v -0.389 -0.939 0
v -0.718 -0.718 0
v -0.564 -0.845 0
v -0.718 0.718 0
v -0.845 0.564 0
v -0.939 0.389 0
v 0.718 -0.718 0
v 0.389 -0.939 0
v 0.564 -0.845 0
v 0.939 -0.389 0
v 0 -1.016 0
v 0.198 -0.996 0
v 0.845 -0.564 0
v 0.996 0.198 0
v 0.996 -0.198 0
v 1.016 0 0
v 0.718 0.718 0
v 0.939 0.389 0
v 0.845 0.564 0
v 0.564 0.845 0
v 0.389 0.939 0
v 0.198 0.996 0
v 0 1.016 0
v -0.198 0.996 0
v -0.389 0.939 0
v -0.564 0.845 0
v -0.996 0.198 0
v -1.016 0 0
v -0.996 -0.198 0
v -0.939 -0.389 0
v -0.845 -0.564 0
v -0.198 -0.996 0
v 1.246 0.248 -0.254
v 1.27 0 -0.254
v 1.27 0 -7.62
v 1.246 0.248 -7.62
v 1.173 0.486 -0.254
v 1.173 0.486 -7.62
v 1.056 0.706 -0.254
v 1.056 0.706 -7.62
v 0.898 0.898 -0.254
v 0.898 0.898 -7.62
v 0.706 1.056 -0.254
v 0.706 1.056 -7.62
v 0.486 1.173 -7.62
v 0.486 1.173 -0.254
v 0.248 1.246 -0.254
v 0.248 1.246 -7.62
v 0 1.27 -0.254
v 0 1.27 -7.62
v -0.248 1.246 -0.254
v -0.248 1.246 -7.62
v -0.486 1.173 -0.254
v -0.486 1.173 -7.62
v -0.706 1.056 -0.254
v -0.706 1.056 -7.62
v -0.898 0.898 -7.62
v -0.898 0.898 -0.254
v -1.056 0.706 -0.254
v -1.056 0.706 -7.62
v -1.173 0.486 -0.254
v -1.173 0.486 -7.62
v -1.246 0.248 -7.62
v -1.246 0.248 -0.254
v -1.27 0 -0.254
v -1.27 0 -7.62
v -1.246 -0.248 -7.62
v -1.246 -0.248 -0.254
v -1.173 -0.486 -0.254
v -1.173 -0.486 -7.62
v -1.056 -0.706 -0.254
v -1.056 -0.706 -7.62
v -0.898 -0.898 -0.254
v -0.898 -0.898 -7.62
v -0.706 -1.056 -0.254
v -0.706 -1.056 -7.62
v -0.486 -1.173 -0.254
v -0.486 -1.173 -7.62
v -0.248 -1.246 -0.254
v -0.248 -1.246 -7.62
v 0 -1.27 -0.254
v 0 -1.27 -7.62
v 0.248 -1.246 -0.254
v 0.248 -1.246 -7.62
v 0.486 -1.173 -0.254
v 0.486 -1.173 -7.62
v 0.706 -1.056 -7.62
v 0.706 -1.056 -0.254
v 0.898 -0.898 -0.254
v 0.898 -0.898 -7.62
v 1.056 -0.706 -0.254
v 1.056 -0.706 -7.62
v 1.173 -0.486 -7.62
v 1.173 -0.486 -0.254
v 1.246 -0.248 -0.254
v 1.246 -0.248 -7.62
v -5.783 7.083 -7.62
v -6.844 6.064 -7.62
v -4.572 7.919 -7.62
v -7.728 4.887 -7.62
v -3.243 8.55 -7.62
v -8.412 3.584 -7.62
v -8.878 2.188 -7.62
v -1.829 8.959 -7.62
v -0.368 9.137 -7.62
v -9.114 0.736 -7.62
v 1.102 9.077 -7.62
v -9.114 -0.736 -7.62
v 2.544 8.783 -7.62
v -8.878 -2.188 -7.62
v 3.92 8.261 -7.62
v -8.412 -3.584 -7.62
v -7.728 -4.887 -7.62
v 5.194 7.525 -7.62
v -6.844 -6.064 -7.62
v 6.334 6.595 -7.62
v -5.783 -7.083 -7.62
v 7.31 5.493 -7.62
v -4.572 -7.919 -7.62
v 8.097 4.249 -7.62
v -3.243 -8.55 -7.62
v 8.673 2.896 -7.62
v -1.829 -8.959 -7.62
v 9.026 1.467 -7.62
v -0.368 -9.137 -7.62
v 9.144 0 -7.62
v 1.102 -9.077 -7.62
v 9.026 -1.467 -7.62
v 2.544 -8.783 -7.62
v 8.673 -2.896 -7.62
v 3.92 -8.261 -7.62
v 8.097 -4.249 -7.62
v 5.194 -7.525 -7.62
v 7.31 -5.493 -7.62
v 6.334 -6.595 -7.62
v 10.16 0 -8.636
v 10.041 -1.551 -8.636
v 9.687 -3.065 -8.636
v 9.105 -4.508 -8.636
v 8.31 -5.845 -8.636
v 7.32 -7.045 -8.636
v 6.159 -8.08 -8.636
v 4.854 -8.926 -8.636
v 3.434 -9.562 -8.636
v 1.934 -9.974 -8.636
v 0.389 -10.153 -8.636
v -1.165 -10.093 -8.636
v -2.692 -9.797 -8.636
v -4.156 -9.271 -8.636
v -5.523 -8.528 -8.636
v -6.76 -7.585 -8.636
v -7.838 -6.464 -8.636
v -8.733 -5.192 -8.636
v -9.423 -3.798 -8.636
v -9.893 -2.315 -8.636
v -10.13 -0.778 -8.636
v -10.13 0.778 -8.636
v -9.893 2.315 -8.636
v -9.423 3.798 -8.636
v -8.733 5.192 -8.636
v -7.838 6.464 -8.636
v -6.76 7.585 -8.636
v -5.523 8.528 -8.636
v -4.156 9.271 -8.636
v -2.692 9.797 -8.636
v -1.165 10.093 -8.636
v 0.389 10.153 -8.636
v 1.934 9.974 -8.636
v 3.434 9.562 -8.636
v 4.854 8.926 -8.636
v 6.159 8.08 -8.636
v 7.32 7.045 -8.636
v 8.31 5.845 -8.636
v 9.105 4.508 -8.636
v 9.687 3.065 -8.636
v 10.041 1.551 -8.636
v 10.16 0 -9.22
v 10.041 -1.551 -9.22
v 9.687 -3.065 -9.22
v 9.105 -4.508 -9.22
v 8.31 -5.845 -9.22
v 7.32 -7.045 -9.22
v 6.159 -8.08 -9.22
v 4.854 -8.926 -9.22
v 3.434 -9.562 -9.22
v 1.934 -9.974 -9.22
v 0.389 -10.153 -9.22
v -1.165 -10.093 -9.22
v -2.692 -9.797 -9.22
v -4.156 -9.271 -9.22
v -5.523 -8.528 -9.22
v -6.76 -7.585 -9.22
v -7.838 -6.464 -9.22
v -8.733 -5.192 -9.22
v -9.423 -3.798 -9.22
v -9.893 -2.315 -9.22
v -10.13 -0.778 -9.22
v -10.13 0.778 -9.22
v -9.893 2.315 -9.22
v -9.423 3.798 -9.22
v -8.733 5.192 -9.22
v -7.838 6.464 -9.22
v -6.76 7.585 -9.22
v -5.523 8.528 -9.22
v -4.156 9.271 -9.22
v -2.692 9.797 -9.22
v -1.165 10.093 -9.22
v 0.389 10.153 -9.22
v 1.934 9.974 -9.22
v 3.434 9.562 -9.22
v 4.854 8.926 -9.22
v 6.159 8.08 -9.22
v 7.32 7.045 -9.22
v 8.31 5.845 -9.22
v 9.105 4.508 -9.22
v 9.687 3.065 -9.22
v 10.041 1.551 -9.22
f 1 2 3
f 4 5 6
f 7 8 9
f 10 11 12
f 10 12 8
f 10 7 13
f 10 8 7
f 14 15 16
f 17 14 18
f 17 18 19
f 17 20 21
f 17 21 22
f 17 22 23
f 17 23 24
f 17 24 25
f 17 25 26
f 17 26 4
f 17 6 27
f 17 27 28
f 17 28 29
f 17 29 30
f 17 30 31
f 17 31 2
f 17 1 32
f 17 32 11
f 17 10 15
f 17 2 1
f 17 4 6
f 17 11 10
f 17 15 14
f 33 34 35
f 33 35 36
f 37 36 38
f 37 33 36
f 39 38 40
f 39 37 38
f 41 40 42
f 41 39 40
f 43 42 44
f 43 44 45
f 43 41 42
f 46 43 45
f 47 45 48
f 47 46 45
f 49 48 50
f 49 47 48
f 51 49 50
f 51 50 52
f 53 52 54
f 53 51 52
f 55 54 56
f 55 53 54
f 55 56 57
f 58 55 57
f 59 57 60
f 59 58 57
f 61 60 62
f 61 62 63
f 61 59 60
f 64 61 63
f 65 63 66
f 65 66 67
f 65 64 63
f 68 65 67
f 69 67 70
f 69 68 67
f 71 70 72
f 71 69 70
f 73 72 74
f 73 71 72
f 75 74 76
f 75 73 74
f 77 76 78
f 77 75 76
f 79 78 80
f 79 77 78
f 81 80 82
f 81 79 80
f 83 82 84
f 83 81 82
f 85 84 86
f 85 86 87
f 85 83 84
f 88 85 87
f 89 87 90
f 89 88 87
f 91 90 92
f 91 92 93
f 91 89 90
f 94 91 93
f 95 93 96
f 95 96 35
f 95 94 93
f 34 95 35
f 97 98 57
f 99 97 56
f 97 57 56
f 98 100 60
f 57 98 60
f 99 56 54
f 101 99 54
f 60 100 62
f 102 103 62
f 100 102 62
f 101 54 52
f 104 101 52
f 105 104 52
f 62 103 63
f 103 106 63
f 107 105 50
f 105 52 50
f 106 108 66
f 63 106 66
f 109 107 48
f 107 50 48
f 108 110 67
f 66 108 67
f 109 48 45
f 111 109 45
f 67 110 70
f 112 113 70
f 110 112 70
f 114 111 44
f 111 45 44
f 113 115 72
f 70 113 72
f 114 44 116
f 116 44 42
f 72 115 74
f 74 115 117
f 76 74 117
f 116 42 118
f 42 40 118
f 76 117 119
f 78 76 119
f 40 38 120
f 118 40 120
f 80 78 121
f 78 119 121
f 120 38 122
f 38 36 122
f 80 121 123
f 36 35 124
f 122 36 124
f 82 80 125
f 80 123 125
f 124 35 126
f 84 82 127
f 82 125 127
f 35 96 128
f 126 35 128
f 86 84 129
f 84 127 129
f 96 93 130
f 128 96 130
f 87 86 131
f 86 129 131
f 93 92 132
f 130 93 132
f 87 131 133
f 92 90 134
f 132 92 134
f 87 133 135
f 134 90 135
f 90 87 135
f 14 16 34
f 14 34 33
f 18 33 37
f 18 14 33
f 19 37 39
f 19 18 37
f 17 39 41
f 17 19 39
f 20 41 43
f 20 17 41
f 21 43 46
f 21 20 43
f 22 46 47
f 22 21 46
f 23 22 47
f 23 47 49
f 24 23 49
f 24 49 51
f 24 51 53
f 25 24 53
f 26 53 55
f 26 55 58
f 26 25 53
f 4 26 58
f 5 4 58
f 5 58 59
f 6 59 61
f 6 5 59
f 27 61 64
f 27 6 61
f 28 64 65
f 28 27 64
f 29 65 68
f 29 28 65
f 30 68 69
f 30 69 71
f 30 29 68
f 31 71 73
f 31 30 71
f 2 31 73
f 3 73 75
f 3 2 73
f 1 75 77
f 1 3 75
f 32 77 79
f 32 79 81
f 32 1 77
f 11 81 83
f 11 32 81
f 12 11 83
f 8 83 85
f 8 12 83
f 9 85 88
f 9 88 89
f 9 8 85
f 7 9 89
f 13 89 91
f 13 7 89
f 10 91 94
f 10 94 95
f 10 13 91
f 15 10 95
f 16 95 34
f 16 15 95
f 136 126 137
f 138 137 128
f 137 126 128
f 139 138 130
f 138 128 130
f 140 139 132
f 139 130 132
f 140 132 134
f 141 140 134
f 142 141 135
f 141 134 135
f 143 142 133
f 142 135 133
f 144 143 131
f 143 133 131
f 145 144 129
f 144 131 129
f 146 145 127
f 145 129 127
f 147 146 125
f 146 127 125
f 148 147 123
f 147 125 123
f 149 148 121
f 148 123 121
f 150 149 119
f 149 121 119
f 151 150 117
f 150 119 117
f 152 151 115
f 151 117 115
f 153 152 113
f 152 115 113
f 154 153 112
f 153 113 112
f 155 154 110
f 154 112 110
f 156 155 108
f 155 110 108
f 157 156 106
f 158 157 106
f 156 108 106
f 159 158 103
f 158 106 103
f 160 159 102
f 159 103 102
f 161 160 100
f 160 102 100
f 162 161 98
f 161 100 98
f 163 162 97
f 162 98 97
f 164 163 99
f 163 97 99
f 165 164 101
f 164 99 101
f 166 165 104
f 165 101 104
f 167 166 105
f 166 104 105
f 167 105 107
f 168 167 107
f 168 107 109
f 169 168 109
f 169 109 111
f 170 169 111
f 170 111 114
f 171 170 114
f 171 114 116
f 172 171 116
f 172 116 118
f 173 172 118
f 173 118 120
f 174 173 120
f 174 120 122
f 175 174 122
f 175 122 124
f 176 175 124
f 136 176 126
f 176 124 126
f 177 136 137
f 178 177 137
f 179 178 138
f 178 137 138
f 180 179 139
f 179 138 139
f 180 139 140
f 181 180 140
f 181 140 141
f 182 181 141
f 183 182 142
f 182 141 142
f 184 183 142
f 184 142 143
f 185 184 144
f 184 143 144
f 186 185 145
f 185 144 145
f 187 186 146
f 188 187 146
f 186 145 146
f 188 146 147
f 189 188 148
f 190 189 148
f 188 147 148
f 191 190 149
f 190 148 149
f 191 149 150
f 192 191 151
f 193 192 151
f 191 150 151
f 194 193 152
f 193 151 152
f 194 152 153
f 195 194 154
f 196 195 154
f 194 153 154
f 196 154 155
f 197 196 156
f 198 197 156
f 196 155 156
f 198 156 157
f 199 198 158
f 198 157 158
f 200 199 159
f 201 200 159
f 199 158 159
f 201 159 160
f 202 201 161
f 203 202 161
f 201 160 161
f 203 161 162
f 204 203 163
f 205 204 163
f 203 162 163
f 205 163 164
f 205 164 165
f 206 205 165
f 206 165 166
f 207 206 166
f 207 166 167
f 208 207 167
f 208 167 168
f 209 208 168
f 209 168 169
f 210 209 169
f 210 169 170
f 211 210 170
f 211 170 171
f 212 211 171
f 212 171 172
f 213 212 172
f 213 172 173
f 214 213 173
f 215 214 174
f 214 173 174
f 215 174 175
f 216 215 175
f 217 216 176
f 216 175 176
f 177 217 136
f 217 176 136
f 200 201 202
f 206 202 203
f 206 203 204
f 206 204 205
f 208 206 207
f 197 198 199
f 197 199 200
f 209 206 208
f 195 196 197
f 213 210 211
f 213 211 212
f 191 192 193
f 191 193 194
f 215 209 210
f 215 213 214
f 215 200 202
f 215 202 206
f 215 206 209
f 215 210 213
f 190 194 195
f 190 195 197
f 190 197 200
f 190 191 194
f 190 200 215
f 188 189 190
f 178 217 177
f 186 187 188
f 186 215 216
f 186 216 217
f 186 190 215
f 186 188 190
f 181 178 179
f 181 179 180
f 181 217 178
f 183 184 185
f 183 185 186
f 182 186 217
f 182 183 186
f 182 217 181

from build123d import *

# Parameters (mm, degrees)
F0_R     = 1.27
F1_DEPTH = 7.62
F2_R     = 10.16
F3_DEPTH = 1.6002
F4_SIZE  = 1.016
F5_SIZE  = 0.254


with BuildPart() as f1:
    # F0 (on Top) → F1 (new body)
    with BuildSketch(Plane.XY):
        Circle(F0_R)
    extrude(amount=-F1_DEPTH)

    # F2 (on face) → F3 (join)
    with BuildSketch(Plane(origin=(0, 0, -7.62), x_dir=(1, 0, 0), z_dir=(0, 0, -1))):
        Circle(F2_R)
    extrude(amount=F3_DEPTH)

    # F4
    f4_edges = [f1.edges().sort_by_distance(p)[0] for p in [
        (-10.16, 0, -7.62),
    ]]
    chamfer(f4_edges, length=F4_SIZE)

    # F5
    f5_edges = [f1.edges().sort_by_distance(p)[0] for p in [
        (-1.27, 0, 0),
    ]]
    chamfer(f5_edges, length=F5_SIZE)


solid = f1.part
